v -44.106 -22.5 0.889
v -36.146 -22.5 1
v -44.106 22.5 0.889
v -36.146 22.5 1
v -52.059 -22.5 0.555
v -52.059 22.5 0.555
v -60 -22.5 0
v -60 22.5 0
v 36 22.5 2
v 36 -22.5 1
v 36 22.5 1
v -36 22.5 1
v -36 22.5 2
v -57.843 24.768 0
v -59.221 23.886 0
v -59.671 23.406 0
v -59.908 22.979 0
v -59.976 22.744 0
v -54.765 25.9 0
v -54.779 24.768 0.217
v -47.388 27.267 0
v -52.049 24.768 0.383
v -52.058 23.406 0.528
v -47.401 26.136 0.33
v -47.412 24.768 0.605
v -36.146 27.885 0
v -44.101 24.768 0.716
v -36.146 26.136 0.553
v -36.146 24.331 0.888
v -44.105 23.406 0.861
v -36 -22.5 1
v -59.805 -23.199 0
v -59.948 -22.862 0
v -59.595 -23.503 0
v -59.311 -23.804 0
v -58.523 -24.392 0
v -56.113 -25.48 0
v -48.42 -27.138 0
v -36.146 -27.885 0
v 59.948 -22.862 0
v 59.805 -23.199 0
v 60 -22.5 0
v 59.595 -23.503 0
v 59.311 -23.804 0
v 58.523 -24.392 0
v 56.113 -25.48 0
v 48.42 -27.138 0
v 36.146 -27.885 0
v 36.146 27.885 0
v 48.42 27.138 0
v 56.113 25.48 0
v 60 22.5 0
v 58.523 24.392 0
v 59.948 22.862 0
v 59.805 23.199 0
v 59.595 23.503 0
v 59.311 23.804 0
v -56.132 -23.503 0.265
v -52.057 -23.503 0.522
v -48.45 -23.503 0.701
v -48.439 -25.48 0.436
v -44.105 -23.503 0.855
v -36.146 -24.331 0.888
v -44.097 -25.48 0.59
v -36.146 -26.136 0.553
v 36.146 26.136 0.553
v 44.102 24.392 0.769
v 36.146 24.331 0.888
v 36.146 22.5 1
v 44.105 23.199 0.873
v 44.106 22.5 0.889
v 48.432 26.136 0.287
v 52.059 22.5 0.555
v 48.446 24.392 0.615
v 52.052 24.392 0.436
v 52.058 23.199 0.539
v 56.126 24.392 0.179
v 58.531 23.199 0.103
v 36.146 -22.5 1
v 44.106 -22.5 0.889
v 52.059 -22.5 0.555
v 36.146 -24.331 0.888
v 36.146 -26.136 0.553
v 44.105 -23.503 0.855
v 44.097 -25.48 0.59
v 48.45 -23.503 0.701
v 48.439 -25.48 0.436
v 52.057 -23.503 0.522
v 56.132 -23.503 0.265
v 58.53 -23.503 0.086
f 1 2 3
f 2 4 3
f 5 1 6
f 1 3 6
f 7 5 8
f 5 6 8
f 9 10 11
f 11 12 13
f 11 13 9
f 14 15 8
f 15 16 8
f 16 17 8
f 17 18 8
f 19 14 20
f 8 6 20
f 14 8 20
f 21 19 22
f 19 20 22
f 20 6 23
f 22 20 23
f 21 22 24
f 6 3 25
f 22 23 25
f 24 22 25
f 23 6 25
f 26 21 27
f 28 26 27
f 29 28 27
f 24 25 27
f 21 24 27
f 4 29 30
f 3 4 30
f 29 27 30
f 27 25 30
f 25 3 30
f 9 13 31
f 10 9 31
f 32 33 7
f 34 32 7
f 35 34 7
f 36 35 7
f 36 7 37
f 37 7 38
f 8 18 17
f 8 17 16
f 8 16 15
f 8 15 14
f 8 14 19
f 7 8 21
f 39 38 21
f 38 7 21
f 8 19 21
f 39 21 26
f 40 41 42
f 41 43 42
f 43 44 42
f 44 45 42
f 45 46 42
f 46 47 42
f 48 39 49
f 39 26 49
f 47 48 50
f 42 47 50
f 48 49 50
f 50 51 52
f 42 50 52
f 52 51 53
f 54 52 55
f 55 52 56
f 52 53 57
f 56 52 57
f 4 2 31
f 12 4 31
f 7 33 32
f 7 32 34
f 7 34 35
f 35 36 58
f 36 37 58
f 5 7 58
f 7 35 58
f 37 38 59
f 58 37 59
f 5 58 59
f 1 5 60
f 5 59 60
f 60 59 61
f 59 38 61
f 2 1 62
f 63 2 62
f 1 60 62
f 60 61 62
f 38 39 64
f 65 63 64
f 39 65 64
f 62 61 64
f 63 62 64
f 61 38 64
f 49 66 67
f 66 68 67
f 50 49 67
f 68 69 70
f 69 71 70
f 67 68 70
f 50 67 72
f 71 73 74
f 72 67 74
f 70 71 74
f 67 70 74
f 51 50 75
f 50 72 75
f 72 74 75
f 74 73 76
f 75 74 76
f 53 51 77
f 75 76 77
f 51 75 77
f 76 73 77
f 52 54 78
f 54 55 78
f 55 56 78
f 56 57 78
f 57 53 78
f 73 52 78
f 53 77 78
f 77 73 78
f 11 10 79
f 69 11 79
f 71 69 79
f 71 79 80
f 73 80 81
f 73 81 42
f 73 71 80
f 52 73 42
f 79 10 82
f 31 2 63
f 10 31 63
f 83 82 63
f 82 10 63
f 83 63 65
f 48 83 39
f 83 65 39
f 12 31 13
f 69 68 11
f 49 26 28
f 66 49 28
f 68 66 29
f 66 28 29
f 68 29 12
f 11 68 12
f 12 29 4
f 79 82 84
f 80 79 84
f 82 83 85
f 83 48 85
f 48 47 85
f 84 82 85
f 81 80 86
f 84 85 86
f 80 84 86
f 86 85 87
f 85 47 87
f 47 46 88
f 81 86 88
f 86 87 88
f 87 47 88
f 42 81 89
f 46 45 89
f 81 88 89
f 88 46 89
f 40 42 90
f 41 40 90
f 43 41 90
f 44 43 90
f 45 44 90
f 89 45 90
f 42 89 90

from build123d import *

# Parameters (mm, degrees)
F0_W         = 120
F0_H         = 75
F1_DEPTH     = 1
F0_W_2       = 24
F0_H_2       = 45
F2_DEPTH     = 2
F3_DEPTH     = 2
F4_DEPTH     = 2
F6_DEPTH     = 1000
F7_T1_DEPTH  = 194.2686044191
F8_T1_DEPTH  = 194.2686044191
F9_T1_DEPTH  = 72.2925582324
F9_T4_ANGLE  = 12.3400437426
F9_T6_ANGLE  = 12.3400437426
F10_T1_DEPTH = 72.2925582324
F10_T4_ANGLE = 12.3400437426
F10_T6_ANGLE = 12.3400437426


# Not quite as in the source:
# - a fillet or chamfer that OpenCascade refuses, or shapes differently, is made with other operations: its cross-section is extruded or revolved along the edge and cut away or added


with BuildPart() as f1:
    # F0 (on Top) → F1 (new body)
    with BuildSketch(Plane.XY):
        Rectangle(F0_W, F0_H)
        Polygon((-36, -22.5), (-36, 22.5), (-12, 22.5), (12, 22.5), (36, 22.5), (36, -22.5), (12, -22.5), (-12, -22.5), align=None, mode=Mode.SUBTRACT)
    extrude(amount=F1_DEPTH)

    # F0 (on Top) → F2 (join)
    with BuildSketch(Plane.XY):
        with Locations((-24, 0)):
            Rectangle(F0_W_2, F0_H_2)
    extrude(amount=F2_DEPTH)

    # F0 (on Top) → F3 (join)
    with BuildSketch(Plane.XY):
        Rectangle(F0_W_2, F0_H_2)
    extrude(amount=F3_DEPTH)

    # F0 (on Top) → F4 (join)
    with BuildSketch(Plane.XY):
        with Locations((24, 0)):
            Rectangle(F0_W_2, F0_H_2)
    extrude(amount=F4_DEPTH)

    # F5 (on face) → F6 (cut)
    with BuildSketch(Plane(origin=(-60, 0, 0), x_dir=(0, -1, 0), z_dir=(-1, 0, 0))):
        Polygon((22.5, 2), (-22.5, 2), (22.5, 1), align=None)
    extrude(amount=-F6_DEPTH, mode=Mode.SUBTRACT)

    # F7: fillet of radius 285 on 1 edges, made by hand

    # F7_s2 → F7_t1 (cut)
    with BuildSketch(Plane.XZ.offset(-97.1343022095)):
        with BuildLine():
            ThreePointArc((-36.1462791162, 1), (-48.0836155025, 0.7498902546), (-60, 0))
            Line((-60, 0), (-60, 1))
            Line((-60, 1), (-36.1462791162, 1))
        make_face()
    extrude(amount=F7_T1_DEPTH, mode=Mode.SUBTRACT)

    # F8: fillet of radius 285 on 1 edges, made by hand

    # F8_s2 → F8_t1 (cut)
    with BuildSketch(Plane.XZ.offset(-97.1343022095)):
        with BuildLine():
            ThreePointArc((36.1462791162, 1), (48.0836155025, 0.7498902546), (60, 0))
            Line((60, 0), (60, 1))
            Line((60, 1), (36.1462791162, 1))
        make_face()
    extrude(amount=F8_T1_DEPTH, mode=Mode.SUBTRACT)

    # F9: fillet of radius 15 on 1 edges, made by hand

    # F9_s2 → F9_t1 (cut)
    with BuildSketch(Plane.YZ.offset(-36.1462791162)):
        with BuildLine():
            ThreePointArc((-22.5, 1), (-33.1066017178, -3.3933982822), (-37.5, -14))
            Line((-37.5, -14), (-37.5, 1))
            Line((-37.5, 1), (-22.5, 1))
        make_face()
    extrude(amount=F9_T1_DEPTH, mode=Mode.SUBTRACT)

    # F9_s3 → F9_t4 (revolve, cut)
    with BuildSketch(Plane(origin=(-93.7876438564, 0, -20.5176876571), x_dir=(0, 1, 0), z_dir=(-0.9768964499, 0, -0.2137131866))):
        with BuildLine():
            ThreePointArc((-22.5, -15.2863447158), (-33.1066017178, -10.8929464336), (-37.5, -0.2863447158))
            Line((-37.5, -0.2863447158), (-37.5, -15.2863447158))
            Line((-37.5, -15.2863447158), (-22.5, -15.2863447158))
        make_face()
    revolve(axis=Axis((-36.1462791167, -37.5, -283.9999999893), (0, 1, 0)), revolution_arc=F9_T4_ANGLE, mode=Mode.SUBTRACT)

    # F9_s5 → F9_t6 (revolve, cut)
    with BuildSketch(Plane.YZ.offset(36.1462791167)):
        with BuildLine():
            ThreePointArc((-22.5, 1), (-33.1066017178, -3.3933982822), (-37.5, -14))
            Line((-37.5, -14), (-37.5, 1))
            Line((-37.5, 1), (-22.5, 1))
        make_face()
    revolve(axis=Axis((36.1462791167, -37.5, -283.9999999893), (0, 1, 0)), revolution_arc=F9_T6_ANGLE, mode=Mode.SUBTRACT)

    # F10: fillet of radius 15 on 1 edges, made by hand

    # F10_s2 → F10_t1 (cut)
    with BuildSketch(Plane.YZ.offset(-36.1462791162)):
        with BuildLine():
            ThreePointArc((37.5, -14), (33.1066017178, -3.3933982822), (22.5, 1))
            Line((22.5, 1), (37.5, 1))
            Line((37.5, 1), (37.5, -14))
        make_face()
    extrude(amount=F10_T1_DEPTH, mode=Mode.SUBTRACT)

    # F10_s3 → F10_t4 (revolve, cut)
    with BuildSketch(Plane.YZ.offset(36.1462791167)):
        with BuildLine():
            ThreePointArc((37.5, -14), (33.1066017178, -3.3933982822), (22.5, 1))
            Line((22.5, 1), (37.5, 1))
            Line((37.5, 1), (37.5, -14))
        make_face()
    revolve(axis=Axis((36.1462791167, 37.5, -283.9999999893), (0, 1, 0)), revolution_arc=F10_T4_ANGLE, mode=Mode.SUBTRACT)

    # F10_s5 → F10_t6 (revolve, cut)
    with BuildSketch(Plane(origin=(-93.7876438564, 0, -20.5176876571), x_dir=(0, 1, 0), z_dir=(-0.9768964499, 0, -0.2137131866))):
        with BuildLine():
            ThreePointArc((37.5, -0.2863447158), (33.1066017178, -10.8929464336), (22.5, -15.2863447158))
            Line((22.5, -15.2863447158), (37.5, -15.2863447158))
            Line((37.5, -15.2863447158), (37.5, -0.2863447158))
        make_face()
    revolve(axis=Axis((-36.1462791167, 37.5, -283.9999999893), (0, 1, 0)), revolution_arc=F10_T6_ANGLE, mode=Mode.SUBTRACT)


solid = f1.part
